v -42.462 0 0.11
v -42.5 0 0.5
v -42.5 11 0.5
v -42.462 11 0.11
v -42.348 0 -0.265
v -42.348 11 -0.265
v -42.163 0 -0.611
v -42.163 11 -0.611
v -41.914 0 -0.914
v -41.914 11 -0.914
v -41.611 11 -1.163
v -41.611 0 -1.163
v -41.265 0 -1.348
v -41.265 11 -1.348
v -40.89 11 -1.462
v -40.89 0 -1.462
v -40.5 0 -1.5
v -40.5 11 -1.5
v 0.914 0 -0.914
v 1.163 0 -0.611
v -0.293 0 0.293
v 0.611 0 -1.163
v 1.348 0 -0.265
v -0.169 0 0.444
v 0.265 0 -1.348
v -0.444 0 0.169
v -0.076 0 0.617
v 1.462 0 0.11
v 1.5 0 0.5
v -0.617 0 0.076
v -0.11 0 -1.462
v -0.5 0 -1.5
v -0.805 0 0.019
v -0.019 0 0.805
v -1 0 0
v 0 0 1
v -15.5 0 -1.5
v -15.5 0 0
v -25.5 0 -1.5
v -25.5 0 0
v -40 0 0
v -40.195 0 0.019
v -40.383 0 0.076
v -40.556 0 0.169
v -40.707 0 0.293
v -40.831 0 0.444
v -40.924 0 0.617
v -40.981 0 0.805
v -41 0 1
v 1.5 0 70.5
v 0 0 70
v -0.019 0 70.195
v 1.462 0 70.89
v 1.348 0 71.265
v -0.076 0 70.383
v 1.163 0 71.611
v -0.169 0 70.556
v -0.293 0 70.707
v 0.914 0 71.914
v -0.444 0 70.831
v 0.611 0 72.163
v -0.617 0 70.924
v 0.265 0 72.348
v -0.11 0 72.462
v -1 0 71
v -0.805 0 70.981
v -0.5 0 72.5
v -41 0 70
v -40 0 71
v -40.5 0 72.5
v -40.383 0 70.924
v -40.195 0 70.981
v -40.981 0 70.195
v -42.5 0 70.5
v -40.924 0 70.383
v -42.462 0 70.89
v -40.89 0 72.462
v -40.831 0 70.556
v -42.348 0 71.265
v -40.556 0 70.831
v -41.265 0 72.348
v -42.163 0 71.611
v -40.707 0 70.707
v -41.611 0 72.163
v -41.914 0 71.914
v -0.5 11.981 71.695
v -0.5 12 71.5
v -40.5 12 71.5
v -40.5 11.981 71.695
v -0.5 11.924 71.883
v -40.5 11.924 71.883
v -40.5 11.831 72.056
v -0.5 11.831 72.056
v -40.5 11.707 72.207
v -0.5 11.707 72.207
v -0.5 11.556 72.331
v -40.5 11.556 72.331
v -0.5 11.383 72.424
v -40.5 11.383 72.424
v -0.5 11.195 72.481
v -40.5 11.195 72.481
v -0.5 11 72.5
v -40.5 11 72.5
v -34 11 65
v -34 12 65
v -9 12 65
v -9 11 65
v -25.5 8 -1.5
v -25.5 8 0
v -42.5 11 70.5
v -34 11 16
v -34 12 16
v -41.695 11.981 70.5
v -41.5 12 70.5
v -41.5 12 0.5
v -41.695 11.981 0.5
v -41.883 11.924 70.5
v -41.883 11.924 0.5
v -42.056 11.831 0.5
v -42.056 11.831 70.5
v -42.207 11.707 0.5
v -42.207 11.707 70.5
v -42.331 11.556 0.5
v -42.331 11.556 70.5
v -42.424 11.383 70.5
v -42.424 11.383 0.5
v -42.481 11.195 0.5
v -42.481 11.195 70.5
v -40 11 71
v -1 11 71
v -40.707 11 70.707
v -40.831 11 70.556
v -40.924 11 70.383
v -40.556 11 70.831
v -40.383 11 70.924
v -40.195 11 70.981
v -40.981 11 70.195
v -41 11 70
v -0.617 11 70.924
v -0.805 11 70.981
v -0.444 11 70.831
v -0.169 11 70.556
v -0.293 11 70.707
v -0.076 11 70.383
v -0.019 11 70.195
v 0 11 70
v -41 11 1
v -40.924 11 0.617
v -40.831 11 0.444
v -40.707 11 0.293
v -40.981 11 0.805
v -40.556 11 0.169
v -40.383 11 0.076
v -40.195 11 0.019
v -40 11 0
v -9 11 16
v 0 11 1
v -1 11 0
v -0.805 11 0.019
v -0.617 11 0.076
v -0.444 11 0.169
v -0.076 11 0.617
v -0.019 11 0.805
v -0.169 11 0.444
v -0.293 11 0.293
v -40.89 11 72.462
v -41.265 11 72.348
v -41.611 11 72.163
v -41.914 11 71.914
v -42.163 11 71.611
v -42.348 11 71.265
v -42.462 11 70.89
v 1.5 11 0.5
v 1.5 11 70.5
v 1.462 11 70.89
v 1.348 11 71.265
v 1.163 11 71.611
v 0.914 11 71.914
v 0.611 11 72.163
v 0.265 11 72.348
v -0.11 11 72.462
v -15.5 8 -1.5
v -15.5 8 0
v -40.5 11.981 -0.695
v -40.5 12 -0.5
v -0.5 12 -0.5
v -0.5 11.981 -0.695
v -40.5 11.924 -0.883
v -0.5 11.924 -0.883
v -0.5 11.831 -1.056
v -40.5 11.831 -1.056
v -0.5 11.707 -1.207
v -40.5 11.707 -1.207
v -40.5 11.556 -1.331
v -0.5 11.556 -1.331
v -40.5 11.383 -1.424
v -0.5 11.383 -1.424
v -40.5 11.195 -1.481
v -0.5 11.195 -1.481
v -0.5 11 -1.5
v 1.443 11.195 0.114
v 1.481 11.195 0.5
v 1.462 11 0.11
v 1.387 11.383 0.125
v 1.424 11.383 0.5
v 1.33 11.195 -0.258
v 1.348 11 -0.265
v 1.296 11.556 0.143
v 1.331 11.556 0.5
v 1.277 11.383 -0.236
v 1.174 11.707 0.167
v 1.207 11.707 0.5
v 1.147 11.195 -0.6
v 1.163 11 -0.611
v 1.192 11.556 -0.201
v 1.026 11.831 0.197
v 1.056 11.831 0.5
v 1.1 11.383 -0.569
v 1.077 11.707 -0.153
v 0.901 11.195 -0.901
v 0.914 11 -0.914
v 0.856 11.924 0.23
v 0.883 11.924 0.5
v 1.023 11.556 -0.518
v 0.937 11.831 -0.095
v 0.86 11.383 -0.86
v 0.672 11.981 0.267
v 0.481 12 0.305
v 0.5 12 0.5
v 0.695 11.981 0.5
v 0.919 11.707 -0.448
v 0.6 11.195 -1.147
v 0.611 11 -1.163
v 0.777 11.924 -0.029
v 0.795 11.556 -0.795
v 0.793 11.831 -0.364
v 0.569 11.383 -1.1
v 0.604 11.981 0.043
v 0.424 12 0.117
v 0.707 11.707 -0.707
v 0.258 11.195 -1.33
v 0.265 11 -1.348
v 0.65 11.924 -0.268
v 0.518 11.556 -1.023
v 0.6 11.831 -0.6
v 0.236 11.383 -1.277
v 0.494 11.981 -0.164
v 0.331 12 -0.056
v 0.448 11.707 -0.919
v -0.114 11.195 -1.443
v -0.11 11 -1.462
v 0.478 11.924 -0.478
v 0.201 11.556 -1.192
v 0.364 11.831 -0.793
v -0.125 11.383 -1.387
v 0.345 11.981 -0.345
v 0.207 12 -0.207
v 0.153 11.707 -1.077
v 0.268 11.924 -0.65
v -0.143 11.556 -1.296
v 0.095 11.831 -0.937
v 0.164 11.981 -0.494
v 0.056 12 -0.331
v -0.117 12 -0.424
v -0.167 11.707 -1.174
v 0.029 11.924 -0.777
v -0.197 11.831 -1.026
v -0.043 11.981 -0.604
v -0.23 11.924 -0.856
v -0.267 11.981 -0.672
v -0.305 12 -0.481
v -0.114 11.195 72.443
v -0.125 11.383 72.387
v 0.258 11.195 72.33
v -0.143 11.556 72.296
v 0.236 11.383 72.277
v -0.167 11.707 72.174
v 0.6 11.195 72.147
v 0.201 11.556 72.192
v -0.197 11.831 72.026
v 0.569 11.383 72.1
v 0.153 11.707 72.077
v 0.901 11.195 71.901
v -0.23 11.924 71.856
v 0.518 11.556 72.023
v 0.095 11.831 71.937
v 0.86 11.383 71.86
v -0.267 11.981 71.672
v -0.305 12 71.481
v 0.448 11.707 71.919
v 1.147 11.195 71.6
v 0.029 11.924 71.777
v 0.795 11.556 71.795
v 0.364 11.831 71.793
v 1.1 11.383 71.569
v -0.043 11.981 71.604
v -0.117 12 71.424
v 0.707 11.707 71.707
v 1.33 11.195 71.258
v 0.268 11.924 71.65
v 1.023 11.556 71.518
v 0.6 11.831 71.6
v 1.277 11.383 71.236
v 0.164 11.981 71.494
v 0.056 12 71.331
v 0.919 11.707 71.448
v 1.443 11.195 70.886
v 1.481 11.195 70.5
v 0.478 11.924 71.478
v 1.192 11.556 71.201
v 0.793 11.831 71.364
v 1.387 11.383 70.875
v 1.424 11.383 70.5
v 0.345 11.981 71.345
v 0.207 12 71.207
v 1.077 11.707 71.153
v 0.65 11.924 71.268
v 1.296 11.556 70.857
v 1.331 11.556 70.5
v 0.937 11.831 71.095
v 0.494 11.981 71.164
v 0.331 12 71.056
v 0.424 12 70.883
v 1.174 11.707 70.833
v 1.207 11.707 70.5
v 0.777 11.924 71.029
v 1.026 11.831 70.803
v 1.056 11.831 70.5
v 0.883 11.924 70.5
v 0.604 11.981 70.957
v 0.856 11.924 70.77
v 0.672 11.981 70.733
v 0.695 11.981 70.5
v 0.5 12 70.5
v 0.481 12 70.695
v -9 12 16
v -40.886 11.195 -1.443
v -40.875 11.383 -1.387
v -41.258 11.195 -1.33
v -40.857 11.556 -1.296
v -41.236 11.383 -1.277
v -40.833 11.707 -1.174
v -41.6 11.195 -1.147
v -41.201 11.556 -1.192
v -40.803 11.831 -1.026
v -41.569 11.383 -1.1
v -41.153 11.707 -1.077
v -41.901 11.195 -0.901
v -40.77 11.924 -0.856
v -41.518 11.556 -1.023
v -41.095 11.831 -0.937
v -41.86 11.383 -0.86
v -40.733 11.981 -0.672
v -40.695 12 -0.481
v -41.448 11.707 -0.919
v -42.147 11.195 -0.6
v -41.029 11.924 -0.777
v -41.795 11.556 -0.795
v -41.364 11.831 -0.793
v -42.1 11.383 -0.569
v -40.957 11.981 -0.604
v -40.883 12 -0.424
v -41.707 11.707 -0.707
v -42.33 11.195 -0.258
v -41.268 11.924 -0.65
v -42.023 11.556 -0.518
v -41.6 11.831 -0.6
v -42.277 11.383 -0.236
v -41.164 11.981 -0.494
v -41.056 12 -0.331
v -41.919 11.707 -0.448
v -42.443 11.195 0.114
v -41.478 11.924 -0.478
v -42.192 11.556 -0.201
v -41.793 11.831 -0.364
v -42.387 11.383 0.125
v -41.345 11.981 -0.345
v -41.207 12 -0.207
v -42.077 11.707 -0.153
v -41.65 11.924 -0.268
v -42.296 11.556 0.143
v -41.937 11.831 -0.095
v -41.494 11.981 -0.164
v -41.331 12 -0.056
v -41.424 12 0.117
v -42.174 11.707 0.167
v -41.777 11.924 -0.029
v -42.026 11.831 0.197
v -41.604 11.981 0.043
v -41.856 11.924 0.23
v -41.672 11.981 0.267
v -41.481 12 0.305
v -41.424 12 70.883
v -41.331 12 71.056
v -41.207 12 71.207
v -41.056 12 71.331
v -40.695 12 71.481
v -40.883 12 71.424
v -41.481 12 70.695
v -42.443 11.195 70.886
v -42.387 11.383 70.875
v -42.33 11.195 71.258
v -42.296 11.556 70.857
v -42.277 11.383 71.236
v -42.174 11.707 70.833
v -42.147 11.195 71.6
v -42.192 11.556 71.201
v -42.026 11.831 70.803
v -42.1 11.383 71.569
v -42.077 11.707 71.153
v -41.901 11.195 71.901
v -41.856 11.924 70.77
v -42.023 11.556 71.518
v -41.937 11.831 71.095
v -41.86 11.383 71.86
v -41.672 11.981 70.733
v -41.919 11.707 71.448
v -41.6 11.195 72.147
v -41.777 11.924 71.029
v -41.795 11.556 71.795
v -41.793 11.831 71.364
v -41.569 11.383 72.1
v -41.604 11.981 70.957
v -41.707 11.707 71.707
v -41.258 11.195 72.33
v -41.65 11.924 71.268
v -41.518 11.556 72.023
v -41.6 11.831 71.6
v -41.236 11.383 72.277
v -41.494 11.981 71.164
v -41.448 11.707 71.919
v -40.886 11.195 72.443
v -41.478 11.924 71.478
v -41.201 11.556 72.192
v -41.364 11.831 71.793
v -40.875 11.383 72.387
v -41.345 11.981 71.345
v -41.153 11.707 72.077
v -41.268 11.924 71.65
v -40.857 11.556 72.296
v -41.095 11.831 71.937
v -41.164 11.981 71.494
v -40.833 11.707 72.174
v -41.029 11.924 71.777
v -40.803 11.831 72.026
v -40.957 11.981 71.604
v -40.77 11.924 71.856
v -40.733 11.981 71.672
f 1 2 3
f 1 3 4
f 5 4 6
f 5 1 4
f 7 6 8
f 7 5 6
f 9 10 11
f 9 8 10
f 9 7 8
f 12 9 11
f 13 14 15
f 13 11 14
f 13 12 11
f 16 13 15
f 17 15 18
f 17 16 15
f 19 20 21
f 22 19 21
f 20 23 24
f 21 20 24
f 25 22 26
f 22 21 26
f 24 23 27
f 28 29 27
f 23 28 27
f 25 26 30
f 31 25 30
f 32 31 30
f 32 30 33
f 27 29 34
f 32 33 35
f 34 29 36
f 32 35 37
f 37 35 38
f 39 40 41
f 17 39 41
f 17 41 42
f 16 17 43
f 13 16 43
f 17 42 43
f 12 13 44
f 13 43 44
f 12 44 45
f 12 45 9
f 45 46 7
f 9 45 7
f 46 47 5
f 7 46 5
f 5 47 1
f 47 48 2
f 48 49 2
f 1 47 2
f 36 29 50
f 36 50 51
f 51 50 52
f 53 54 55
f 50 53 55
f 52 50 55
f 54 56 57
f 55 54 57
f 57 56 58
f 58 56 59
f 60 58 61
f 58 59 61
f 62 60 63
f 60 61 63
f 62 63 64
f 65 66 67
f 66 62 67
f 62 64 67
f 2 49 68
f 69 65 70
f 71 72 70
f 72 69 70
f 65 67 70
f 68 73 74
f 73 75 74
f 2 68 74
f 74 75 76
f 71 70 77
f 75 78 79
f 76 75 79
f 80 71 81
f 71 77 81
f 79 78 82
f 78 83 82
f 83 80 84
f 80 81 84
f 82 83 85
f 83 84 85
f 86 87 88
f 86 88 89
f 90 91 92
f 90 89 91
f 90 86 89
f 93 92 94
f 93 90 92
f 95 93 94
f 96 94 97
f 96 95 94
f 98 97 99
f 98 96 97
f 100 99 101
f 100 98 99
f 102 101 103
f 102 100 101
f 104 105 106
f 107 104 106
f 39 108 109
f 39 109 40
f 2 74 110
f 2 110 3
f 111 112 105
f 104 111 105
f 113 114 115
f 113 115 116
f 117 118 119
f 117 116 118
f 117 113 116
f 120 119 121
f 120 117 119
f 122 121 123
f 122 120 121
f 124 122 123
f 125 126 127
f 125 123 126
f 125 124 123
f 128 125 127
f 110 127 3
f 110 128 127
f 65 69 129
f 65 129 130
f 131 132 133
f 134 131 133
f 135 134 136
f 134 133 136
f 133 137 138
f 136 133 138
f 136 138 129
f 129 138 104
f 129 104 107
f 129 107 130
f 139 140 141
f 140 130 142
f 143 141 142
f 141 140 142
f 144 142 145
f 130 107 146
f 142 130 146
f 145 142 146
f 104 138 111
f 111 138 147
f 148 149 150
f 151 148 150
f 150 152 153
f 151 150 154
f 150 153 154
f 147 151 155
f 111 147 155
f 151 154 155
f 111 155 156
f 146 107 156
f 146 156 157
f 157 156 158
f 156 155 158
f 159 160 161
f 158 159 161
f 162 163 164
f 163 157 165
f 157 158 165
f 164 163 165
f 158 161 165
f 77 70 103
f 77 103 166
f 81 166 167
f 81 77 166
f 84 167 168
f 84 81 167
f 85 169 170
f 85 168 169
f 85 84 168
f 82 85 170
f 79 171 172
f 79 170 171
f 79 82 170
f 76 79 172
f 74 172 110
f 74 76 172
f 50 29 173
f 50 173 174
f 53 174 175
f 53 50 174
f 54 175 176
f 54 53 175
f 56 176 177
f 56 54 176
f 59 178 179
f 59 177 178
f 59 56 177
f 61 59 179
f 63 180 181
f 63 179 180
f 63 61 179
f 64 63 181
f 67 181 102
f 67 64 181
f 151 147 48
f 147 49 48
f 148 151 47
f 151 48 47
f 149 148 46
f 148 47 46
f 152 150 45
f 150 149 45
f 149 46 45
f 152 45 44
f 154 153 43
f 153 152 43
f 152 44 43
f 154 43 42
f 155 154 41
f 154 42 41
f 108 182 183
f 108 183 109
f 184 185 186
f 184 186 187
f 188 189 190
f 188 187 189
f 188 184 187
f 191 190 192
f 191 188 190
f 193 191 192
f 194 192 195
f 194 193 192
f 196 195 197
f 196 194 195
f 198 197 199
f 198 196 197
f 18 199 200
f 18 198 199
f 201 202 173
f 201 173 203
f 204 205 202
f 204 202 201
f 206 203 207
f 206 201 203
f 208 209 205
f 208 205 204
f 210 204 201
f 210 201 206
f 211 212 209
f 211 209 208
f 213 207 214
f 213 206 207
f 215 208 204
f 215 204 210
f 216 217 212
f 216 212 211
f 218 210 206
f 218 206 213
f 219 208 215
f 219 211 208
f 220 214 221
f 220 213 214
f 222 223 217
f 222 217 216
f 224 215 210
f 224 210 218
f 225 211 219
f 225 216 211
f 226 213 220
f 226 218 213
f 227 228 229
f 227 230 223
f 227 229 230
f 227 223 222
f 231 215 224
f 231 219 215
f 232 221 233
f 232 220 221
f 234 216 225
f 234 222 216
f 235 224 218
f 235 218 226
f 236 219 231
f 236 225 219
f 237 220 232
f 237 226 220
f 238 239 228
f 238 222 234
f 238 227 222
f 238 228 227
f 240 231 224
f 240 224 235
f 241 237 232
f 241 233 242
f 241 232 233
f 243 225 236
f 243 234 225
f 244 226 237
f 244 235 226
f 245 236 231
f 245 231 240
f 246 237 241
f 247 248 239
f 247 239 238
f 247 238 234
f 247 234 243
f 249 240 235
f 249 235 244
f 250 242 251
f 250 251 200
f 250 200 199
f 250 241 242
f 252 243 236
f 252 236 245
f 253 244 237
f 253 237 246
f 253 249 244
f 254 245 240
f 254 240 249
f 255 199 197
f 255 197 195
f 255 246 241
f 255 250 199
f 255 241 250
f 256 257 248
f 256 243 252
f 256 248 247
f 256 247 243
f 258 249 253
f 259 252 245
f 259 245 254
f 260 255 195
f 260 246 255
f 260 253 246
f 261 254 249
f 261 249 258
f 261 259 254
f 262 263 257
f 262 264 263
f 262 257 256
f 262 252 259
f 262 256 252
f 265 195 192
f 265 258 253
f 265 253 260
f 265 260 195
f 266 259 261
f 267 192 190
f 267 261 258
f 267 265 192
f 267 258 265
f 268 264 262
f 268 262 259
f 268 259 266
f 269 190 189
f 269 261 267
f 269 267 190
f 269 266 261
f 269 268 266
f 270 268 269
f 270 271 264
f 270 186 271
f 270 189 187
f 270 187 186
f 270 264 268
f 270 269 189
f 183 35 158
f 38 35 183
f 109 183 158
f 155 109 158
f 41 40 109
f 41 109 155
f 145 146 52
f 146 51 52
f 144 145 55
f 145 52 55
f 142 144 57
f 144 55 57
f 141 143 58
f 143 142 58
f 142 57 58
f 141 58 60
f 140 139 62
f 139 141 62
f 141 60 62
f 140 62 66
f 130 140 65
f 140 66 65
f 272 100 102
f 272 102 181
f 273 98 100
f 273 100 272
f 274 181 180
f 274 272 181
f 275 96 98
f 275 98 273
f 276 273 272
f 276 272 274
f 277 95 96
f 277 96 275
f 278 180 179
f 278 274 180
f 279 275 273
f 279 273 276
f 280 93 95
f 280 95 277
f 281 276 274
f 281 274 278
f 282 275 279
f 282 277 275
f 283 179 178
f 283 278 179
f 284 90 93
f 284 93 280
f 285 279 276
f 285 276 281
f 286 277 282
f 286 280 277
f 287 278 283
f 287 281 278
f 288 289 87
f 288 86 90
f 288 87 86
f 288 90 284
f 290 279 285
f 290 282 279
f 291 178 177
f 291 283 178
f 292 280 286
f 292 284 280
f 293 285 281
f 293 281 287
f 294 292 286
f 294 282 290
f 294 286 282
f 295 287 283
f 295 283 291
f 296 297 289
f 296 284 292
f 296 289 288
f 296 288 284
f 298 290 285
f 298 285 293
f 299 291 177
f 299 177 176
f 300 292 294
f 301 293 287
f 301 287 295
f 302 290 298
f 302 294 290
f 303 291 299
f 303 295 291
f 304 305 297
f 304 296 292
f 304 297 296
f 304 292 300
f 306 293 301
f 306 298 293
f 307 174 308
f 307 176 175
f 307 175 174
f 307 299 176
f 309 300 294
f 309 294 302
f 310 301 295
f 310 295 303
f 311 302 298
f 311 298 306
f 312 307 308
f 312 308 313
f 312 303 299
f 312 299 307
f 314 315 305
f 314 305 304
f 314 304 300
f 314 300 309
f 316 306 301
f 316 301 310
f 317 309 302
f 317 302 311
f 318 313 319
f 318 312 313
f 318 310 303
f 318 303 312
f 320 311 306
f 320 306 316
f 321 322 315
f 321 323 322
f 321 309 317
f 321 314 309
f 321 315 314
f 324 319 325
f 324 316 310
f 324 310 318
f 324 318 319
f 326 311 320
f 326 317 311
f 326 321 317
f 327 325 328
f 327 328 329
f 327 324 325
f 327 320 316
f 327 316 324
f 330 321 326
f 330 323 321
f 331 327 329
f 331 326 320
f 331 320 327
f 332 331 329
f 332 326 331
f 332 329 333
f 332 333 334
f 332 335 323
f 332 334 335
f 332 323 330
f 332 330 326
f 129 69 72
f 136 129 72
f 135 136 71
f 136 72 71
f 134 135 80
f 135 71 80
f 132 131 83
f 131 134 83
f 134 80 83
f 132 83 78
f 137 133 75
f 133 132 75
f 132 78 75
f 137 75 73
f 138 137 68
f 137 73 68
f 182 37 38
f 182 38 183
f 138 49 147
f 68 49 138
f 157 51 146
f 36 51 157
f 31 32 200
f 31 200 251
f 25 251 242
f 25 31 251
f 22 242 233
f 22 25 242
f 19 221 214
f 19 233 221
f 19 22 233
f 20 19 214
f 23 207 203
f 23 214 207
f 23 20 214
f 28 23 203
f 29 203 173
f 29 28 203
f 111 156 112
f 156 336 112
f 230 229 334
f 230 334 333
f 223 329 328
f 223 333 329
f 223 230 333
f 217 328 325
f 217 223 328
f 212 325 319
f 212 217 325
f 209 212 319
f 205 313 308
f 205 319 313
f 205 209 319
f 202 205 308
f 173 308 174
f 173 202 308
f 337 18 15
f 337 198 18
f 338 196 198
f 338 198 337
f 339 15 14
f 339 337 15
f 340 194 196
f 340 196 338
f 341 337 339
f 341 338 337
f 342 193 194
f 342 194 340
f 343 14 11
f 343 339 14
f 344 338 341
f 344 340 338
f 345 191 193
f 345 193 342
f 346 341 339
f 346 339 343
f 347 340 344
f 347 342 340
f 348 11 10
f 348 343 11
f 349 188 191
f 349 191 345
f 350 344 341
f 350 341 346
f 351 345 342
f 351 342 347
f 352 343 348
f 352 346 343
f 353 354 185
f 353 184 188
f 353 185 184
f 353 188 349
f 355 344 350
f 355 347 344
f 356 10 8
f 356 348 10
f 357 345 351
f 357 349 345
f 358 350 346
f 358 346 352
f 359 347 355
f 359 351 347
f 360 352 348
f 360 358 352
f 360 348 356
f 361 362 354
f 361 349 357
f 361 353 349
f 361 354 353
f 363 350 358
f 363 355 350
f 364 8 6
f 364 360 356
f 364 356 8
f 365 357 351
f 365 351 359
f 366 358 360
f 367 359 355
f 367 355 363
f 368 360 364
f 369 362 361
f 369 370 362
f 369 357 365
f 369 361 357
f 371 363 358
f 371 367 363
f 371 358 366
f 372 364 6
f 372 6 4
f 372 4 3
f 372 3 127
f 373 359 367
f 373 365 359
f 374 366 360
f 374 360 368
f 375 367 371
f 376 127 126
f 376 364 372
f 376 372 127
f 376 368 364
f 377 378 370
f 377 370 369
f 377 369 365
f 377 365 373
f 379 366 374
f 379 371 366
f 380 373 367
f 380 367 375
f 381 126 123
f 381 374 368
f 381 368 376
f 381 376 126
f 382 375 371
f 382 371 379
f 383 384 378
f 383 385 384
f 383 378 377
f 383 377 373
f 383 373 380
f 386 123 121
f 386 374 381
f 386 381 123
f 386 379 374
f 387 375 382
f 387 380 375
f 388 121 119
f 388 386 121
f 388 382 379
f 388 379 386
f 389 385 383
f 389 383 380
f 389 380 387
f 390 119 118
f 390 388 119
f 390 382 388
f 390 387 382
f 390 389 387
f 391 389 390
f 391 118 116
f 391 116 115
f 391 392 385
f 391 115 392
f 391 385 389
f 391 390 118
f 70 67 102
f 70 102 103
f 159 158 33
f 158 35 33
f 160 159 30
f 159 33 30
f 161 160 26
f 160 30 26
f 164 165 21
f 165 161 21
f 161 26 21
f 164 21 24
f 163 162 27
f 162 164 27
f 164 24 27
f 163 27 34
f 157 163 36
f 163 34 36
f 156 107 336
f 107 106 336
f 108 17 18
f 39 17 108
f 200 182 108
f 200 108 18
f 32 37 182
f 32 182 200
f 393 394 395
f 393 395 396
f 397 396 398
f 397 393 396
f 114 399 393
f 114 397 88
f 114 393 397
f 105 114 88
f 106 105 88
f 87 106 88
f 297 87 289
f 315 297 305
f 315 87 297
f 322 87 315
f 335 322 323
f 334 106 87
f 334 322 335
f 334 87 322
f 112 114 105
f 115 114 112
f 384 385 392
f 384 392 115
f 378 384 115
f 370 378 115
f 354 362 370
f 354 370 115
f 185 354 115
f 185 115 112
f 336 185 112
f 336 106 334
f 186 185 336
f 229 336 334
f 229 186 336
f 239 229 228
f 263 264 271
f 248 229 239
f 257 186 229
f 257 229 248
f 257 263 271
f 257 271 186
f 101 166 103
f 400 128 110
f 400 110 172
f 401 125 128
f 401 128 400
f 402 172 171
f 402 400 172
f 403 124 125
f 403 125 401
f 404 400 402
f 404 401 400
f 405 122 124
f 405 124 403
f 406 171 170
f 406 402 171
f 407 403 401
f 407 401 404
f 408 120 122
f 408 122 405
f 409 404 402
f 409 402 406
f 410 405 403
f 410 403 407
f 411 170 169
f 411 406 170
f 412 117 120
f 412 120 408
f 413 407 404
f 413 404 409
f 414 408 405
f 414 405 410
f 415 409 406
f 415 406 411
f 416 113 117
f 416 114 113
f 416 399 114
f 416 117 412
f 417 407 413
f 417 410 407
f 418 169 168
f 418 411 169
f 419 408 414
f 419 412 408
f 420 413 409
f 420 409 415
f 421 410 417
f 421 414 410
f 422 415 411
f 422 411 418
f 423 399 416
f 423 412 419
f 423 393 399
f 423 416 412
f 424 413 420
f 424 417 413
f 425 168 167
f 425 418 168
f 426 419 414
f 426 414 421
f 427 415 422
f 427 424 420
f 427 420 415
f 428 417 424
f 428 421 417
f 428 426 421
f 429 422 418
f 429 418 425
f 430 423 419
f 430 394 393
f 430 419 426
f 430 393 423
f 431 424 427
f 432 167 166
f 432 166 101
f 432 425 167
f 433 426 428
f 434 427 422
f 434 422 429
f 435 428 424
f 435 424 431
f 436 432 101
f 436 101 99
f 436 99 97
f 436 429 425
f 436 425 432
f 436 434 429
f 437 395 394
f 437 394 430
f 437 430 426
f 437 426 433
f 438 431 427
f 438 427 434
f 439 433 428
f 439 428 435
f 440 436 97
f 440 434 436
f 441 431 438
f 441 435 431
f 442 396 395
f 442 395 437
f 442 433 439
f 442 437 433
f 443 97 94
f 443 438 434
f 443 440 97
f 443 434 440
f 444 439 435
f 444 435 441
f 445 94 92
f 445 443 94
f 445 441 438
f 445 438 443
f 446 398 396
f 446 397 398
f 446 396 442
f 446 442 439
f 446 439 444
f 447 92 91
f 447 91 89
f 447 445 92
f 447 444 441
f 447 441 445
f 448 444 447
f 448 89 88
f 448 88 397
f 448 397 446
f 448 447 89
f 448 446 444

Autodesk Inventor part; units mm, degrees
ref_plane "YZ Plane" through (0, 0, 0) normal (1, 0, 0) x (0, 1, 0)
ref_plane "XZ Plane" through (0, 0, 0) normal (0, 1, 0) x (-1, 0, 0)
ref_plane "XY Plane" through (0, 0, 0) normal (0, 0, 1) x (1, 0, 0)
sketch "Skizze1" plane through (0, 0, 0) normal (0, 1, 0) x (-1, 0, 0)
  line L0 (1, 0) -> (40, 0)
  line L1 (41, 1) -> (41, 70)
  line L2 (40, 71) -> (1, 71)
  line L3 (0, 70) -> (0, 1)
  line L4 (42.5, 70.5) -> (42.5, 0.5)
  line L5 (40.5, -1.5) -> (0.5, -1.5)
  line L6 (-1.5, 0.5) -> (-1.5, 70.5)
  line L7 (0.5, 72.5) -> (40.5, 72.5)
  arc A0 (42.5, 70.5) -> (40.5, 72.5) centre (40.5, 70.5) ccw
  arc A1 (40.5, -1.5) -> (42.5, 0.5) centre (40.5, 0.5) ccw
  arc A2 (-1.5, 0.5) -> (0.5, -1.5) centre (0.5, 0.5) ccw
  arc A3 (0.5, 72.5) -> (-1.5, 70.5) centre (0.5, 70.5) ccw
  arc A4 (41, 70) -> (40, 71) centre (40, 70) ccw
  arc A5 (40, 0) -> (41, 1) centre (40, 1) ccw
  arc A6 (0, 1) -> (1, 0) centre (1, 1) ccw
  arc A7 (1, 71) -> (0, 70) centre (1, 70) ccw
  point P0 (0, 0)
  point P1 (41, 71)
  point P2 (41, 0)
  point P3 (0, 71)
  dimension "d0" = 41
  dimension "d1" = 71
  dimension "d2" = 1.5
  dimension "d3" = 2
  dimension "d4" = 1
extrude "Extrusion1" add sketch "Skizze1" along normal blind 11
sketch "Skizze2" plane through (0, 11, 0) normal (0, 1, 0) x (1, 0, 0)
  line L0 (1.5, -70.5) -> (1.5, -0.5) projected
  arc A0 (1.5, -0.5) -> (-0.5, 1.5) centre (-0.5, -0.5) ccw projected
  line L1 (-0.5, 1.5) -> (-40.5, 1.5) projected
  arc A1 (-40.5, 1.5) -> (-42.5, -0.5) centre (-40.5, -0.5) ccw projected
  line L2 (-42.5, -0.5) -> (-42.5, -70.5) projected
  arc A2 (-42.5, -70.5) -> (-40.5, -72.5) centre (-40.5, -70.5) ccw projected
  line L3 (-40.5, -72.5) -> (-0.5, -72.5) projected
  arc A3 (-0.5, -72.5) -> (1.5, -70.5) centre (-0.5, -70.5) ccw projected
  arc A4 (0, -1) -> (-1, 0) centre (-1, -1) ccw projected
  line L4 (0, -1) -> (0, -70) projected
  arc A5 (-1, -71) -> (0, -70) centre (-1, -70) ccw projected
  line L5 (-1, -71) -> (-40, -71) projected
  arc A6 (-41, -70) -> (-40, -71) centre (-40, -70) ccw projected
  line L6 (-41, -70) -> (-41, -1) projected
  arc A7 (-40, 0) -> (-41, -1) centre (-40, -1) ccw projected
  line L7 (-40, 0) -> (-1, 0) projected
  point P0 (0, 0)
extrude "Extrusion2" add sketch "Skizze2" along normal blind 1 contours A3 L3 A2 L2 A1 L1 A0 L0 | L4 A5 L5 A6 L6 A7 L7 A4
fillet "Rundung1" radius 1 8 edges at (0.9142, 12, -0.9142) (-20.5, 12, -1.5) (-41.9142, 12, -0.9142) (-42.5, 12, 35.5) (-41.9142, 12, 71.9142) (-20.5, 12, 72.5) (0.9142, 12, 71.9142) (1.5, 12, 35.5)
sketch "Skizze5" plane through (0, 12, 0) normal (0, 1, 0) x (1, 0, 0)
  line L0 (-34, -65) -> (-9, -65)
  line L1 (-9, -65) -> (-9, -16)
  line L2 (-9, -16) -> (-34, -16)
  line L3 (-34, -16) -> (-34, -65)
  line L4 (-40, 0) -> (-1, 0) projected
  line L5 (-41, -70) -> (-41, -1) projected
  line L6 (0, -1) -> (0, -70) projected
  point P0 (0, 0)
  dimension "d22" = 16
  dimension "d23" = 7
  dimension "d24" = 9
  dimension "d25" = 49
extrude "Extrusion5" cut sketch "Skizze5" against normal blind 10
sketch "Skizze6" plane through (-0.5, 0, -1.5) normal (0, 0, -1) x (-1, 0, 0)
  line L0 (39.5, 0) -> (0.5, 0) projected
  line L1 (25, 0) -> (15, 0)
  line L2 (15, 0) -> (15, 8)
  line L3 (15, 8) -> (25, 8)
  line L4 (25, 8) -> (25, 0)
  line L5 (42, 0) -> (42, 11) projected
  point P0 (-0.5, 0)
  dimension "d28" = 8
  dimension "d29" = 10
  dimension "d30" = 17
extrude "Extrusion6" cut sketch "Skizze6" against normal blind 11
properties part number "wanne"
